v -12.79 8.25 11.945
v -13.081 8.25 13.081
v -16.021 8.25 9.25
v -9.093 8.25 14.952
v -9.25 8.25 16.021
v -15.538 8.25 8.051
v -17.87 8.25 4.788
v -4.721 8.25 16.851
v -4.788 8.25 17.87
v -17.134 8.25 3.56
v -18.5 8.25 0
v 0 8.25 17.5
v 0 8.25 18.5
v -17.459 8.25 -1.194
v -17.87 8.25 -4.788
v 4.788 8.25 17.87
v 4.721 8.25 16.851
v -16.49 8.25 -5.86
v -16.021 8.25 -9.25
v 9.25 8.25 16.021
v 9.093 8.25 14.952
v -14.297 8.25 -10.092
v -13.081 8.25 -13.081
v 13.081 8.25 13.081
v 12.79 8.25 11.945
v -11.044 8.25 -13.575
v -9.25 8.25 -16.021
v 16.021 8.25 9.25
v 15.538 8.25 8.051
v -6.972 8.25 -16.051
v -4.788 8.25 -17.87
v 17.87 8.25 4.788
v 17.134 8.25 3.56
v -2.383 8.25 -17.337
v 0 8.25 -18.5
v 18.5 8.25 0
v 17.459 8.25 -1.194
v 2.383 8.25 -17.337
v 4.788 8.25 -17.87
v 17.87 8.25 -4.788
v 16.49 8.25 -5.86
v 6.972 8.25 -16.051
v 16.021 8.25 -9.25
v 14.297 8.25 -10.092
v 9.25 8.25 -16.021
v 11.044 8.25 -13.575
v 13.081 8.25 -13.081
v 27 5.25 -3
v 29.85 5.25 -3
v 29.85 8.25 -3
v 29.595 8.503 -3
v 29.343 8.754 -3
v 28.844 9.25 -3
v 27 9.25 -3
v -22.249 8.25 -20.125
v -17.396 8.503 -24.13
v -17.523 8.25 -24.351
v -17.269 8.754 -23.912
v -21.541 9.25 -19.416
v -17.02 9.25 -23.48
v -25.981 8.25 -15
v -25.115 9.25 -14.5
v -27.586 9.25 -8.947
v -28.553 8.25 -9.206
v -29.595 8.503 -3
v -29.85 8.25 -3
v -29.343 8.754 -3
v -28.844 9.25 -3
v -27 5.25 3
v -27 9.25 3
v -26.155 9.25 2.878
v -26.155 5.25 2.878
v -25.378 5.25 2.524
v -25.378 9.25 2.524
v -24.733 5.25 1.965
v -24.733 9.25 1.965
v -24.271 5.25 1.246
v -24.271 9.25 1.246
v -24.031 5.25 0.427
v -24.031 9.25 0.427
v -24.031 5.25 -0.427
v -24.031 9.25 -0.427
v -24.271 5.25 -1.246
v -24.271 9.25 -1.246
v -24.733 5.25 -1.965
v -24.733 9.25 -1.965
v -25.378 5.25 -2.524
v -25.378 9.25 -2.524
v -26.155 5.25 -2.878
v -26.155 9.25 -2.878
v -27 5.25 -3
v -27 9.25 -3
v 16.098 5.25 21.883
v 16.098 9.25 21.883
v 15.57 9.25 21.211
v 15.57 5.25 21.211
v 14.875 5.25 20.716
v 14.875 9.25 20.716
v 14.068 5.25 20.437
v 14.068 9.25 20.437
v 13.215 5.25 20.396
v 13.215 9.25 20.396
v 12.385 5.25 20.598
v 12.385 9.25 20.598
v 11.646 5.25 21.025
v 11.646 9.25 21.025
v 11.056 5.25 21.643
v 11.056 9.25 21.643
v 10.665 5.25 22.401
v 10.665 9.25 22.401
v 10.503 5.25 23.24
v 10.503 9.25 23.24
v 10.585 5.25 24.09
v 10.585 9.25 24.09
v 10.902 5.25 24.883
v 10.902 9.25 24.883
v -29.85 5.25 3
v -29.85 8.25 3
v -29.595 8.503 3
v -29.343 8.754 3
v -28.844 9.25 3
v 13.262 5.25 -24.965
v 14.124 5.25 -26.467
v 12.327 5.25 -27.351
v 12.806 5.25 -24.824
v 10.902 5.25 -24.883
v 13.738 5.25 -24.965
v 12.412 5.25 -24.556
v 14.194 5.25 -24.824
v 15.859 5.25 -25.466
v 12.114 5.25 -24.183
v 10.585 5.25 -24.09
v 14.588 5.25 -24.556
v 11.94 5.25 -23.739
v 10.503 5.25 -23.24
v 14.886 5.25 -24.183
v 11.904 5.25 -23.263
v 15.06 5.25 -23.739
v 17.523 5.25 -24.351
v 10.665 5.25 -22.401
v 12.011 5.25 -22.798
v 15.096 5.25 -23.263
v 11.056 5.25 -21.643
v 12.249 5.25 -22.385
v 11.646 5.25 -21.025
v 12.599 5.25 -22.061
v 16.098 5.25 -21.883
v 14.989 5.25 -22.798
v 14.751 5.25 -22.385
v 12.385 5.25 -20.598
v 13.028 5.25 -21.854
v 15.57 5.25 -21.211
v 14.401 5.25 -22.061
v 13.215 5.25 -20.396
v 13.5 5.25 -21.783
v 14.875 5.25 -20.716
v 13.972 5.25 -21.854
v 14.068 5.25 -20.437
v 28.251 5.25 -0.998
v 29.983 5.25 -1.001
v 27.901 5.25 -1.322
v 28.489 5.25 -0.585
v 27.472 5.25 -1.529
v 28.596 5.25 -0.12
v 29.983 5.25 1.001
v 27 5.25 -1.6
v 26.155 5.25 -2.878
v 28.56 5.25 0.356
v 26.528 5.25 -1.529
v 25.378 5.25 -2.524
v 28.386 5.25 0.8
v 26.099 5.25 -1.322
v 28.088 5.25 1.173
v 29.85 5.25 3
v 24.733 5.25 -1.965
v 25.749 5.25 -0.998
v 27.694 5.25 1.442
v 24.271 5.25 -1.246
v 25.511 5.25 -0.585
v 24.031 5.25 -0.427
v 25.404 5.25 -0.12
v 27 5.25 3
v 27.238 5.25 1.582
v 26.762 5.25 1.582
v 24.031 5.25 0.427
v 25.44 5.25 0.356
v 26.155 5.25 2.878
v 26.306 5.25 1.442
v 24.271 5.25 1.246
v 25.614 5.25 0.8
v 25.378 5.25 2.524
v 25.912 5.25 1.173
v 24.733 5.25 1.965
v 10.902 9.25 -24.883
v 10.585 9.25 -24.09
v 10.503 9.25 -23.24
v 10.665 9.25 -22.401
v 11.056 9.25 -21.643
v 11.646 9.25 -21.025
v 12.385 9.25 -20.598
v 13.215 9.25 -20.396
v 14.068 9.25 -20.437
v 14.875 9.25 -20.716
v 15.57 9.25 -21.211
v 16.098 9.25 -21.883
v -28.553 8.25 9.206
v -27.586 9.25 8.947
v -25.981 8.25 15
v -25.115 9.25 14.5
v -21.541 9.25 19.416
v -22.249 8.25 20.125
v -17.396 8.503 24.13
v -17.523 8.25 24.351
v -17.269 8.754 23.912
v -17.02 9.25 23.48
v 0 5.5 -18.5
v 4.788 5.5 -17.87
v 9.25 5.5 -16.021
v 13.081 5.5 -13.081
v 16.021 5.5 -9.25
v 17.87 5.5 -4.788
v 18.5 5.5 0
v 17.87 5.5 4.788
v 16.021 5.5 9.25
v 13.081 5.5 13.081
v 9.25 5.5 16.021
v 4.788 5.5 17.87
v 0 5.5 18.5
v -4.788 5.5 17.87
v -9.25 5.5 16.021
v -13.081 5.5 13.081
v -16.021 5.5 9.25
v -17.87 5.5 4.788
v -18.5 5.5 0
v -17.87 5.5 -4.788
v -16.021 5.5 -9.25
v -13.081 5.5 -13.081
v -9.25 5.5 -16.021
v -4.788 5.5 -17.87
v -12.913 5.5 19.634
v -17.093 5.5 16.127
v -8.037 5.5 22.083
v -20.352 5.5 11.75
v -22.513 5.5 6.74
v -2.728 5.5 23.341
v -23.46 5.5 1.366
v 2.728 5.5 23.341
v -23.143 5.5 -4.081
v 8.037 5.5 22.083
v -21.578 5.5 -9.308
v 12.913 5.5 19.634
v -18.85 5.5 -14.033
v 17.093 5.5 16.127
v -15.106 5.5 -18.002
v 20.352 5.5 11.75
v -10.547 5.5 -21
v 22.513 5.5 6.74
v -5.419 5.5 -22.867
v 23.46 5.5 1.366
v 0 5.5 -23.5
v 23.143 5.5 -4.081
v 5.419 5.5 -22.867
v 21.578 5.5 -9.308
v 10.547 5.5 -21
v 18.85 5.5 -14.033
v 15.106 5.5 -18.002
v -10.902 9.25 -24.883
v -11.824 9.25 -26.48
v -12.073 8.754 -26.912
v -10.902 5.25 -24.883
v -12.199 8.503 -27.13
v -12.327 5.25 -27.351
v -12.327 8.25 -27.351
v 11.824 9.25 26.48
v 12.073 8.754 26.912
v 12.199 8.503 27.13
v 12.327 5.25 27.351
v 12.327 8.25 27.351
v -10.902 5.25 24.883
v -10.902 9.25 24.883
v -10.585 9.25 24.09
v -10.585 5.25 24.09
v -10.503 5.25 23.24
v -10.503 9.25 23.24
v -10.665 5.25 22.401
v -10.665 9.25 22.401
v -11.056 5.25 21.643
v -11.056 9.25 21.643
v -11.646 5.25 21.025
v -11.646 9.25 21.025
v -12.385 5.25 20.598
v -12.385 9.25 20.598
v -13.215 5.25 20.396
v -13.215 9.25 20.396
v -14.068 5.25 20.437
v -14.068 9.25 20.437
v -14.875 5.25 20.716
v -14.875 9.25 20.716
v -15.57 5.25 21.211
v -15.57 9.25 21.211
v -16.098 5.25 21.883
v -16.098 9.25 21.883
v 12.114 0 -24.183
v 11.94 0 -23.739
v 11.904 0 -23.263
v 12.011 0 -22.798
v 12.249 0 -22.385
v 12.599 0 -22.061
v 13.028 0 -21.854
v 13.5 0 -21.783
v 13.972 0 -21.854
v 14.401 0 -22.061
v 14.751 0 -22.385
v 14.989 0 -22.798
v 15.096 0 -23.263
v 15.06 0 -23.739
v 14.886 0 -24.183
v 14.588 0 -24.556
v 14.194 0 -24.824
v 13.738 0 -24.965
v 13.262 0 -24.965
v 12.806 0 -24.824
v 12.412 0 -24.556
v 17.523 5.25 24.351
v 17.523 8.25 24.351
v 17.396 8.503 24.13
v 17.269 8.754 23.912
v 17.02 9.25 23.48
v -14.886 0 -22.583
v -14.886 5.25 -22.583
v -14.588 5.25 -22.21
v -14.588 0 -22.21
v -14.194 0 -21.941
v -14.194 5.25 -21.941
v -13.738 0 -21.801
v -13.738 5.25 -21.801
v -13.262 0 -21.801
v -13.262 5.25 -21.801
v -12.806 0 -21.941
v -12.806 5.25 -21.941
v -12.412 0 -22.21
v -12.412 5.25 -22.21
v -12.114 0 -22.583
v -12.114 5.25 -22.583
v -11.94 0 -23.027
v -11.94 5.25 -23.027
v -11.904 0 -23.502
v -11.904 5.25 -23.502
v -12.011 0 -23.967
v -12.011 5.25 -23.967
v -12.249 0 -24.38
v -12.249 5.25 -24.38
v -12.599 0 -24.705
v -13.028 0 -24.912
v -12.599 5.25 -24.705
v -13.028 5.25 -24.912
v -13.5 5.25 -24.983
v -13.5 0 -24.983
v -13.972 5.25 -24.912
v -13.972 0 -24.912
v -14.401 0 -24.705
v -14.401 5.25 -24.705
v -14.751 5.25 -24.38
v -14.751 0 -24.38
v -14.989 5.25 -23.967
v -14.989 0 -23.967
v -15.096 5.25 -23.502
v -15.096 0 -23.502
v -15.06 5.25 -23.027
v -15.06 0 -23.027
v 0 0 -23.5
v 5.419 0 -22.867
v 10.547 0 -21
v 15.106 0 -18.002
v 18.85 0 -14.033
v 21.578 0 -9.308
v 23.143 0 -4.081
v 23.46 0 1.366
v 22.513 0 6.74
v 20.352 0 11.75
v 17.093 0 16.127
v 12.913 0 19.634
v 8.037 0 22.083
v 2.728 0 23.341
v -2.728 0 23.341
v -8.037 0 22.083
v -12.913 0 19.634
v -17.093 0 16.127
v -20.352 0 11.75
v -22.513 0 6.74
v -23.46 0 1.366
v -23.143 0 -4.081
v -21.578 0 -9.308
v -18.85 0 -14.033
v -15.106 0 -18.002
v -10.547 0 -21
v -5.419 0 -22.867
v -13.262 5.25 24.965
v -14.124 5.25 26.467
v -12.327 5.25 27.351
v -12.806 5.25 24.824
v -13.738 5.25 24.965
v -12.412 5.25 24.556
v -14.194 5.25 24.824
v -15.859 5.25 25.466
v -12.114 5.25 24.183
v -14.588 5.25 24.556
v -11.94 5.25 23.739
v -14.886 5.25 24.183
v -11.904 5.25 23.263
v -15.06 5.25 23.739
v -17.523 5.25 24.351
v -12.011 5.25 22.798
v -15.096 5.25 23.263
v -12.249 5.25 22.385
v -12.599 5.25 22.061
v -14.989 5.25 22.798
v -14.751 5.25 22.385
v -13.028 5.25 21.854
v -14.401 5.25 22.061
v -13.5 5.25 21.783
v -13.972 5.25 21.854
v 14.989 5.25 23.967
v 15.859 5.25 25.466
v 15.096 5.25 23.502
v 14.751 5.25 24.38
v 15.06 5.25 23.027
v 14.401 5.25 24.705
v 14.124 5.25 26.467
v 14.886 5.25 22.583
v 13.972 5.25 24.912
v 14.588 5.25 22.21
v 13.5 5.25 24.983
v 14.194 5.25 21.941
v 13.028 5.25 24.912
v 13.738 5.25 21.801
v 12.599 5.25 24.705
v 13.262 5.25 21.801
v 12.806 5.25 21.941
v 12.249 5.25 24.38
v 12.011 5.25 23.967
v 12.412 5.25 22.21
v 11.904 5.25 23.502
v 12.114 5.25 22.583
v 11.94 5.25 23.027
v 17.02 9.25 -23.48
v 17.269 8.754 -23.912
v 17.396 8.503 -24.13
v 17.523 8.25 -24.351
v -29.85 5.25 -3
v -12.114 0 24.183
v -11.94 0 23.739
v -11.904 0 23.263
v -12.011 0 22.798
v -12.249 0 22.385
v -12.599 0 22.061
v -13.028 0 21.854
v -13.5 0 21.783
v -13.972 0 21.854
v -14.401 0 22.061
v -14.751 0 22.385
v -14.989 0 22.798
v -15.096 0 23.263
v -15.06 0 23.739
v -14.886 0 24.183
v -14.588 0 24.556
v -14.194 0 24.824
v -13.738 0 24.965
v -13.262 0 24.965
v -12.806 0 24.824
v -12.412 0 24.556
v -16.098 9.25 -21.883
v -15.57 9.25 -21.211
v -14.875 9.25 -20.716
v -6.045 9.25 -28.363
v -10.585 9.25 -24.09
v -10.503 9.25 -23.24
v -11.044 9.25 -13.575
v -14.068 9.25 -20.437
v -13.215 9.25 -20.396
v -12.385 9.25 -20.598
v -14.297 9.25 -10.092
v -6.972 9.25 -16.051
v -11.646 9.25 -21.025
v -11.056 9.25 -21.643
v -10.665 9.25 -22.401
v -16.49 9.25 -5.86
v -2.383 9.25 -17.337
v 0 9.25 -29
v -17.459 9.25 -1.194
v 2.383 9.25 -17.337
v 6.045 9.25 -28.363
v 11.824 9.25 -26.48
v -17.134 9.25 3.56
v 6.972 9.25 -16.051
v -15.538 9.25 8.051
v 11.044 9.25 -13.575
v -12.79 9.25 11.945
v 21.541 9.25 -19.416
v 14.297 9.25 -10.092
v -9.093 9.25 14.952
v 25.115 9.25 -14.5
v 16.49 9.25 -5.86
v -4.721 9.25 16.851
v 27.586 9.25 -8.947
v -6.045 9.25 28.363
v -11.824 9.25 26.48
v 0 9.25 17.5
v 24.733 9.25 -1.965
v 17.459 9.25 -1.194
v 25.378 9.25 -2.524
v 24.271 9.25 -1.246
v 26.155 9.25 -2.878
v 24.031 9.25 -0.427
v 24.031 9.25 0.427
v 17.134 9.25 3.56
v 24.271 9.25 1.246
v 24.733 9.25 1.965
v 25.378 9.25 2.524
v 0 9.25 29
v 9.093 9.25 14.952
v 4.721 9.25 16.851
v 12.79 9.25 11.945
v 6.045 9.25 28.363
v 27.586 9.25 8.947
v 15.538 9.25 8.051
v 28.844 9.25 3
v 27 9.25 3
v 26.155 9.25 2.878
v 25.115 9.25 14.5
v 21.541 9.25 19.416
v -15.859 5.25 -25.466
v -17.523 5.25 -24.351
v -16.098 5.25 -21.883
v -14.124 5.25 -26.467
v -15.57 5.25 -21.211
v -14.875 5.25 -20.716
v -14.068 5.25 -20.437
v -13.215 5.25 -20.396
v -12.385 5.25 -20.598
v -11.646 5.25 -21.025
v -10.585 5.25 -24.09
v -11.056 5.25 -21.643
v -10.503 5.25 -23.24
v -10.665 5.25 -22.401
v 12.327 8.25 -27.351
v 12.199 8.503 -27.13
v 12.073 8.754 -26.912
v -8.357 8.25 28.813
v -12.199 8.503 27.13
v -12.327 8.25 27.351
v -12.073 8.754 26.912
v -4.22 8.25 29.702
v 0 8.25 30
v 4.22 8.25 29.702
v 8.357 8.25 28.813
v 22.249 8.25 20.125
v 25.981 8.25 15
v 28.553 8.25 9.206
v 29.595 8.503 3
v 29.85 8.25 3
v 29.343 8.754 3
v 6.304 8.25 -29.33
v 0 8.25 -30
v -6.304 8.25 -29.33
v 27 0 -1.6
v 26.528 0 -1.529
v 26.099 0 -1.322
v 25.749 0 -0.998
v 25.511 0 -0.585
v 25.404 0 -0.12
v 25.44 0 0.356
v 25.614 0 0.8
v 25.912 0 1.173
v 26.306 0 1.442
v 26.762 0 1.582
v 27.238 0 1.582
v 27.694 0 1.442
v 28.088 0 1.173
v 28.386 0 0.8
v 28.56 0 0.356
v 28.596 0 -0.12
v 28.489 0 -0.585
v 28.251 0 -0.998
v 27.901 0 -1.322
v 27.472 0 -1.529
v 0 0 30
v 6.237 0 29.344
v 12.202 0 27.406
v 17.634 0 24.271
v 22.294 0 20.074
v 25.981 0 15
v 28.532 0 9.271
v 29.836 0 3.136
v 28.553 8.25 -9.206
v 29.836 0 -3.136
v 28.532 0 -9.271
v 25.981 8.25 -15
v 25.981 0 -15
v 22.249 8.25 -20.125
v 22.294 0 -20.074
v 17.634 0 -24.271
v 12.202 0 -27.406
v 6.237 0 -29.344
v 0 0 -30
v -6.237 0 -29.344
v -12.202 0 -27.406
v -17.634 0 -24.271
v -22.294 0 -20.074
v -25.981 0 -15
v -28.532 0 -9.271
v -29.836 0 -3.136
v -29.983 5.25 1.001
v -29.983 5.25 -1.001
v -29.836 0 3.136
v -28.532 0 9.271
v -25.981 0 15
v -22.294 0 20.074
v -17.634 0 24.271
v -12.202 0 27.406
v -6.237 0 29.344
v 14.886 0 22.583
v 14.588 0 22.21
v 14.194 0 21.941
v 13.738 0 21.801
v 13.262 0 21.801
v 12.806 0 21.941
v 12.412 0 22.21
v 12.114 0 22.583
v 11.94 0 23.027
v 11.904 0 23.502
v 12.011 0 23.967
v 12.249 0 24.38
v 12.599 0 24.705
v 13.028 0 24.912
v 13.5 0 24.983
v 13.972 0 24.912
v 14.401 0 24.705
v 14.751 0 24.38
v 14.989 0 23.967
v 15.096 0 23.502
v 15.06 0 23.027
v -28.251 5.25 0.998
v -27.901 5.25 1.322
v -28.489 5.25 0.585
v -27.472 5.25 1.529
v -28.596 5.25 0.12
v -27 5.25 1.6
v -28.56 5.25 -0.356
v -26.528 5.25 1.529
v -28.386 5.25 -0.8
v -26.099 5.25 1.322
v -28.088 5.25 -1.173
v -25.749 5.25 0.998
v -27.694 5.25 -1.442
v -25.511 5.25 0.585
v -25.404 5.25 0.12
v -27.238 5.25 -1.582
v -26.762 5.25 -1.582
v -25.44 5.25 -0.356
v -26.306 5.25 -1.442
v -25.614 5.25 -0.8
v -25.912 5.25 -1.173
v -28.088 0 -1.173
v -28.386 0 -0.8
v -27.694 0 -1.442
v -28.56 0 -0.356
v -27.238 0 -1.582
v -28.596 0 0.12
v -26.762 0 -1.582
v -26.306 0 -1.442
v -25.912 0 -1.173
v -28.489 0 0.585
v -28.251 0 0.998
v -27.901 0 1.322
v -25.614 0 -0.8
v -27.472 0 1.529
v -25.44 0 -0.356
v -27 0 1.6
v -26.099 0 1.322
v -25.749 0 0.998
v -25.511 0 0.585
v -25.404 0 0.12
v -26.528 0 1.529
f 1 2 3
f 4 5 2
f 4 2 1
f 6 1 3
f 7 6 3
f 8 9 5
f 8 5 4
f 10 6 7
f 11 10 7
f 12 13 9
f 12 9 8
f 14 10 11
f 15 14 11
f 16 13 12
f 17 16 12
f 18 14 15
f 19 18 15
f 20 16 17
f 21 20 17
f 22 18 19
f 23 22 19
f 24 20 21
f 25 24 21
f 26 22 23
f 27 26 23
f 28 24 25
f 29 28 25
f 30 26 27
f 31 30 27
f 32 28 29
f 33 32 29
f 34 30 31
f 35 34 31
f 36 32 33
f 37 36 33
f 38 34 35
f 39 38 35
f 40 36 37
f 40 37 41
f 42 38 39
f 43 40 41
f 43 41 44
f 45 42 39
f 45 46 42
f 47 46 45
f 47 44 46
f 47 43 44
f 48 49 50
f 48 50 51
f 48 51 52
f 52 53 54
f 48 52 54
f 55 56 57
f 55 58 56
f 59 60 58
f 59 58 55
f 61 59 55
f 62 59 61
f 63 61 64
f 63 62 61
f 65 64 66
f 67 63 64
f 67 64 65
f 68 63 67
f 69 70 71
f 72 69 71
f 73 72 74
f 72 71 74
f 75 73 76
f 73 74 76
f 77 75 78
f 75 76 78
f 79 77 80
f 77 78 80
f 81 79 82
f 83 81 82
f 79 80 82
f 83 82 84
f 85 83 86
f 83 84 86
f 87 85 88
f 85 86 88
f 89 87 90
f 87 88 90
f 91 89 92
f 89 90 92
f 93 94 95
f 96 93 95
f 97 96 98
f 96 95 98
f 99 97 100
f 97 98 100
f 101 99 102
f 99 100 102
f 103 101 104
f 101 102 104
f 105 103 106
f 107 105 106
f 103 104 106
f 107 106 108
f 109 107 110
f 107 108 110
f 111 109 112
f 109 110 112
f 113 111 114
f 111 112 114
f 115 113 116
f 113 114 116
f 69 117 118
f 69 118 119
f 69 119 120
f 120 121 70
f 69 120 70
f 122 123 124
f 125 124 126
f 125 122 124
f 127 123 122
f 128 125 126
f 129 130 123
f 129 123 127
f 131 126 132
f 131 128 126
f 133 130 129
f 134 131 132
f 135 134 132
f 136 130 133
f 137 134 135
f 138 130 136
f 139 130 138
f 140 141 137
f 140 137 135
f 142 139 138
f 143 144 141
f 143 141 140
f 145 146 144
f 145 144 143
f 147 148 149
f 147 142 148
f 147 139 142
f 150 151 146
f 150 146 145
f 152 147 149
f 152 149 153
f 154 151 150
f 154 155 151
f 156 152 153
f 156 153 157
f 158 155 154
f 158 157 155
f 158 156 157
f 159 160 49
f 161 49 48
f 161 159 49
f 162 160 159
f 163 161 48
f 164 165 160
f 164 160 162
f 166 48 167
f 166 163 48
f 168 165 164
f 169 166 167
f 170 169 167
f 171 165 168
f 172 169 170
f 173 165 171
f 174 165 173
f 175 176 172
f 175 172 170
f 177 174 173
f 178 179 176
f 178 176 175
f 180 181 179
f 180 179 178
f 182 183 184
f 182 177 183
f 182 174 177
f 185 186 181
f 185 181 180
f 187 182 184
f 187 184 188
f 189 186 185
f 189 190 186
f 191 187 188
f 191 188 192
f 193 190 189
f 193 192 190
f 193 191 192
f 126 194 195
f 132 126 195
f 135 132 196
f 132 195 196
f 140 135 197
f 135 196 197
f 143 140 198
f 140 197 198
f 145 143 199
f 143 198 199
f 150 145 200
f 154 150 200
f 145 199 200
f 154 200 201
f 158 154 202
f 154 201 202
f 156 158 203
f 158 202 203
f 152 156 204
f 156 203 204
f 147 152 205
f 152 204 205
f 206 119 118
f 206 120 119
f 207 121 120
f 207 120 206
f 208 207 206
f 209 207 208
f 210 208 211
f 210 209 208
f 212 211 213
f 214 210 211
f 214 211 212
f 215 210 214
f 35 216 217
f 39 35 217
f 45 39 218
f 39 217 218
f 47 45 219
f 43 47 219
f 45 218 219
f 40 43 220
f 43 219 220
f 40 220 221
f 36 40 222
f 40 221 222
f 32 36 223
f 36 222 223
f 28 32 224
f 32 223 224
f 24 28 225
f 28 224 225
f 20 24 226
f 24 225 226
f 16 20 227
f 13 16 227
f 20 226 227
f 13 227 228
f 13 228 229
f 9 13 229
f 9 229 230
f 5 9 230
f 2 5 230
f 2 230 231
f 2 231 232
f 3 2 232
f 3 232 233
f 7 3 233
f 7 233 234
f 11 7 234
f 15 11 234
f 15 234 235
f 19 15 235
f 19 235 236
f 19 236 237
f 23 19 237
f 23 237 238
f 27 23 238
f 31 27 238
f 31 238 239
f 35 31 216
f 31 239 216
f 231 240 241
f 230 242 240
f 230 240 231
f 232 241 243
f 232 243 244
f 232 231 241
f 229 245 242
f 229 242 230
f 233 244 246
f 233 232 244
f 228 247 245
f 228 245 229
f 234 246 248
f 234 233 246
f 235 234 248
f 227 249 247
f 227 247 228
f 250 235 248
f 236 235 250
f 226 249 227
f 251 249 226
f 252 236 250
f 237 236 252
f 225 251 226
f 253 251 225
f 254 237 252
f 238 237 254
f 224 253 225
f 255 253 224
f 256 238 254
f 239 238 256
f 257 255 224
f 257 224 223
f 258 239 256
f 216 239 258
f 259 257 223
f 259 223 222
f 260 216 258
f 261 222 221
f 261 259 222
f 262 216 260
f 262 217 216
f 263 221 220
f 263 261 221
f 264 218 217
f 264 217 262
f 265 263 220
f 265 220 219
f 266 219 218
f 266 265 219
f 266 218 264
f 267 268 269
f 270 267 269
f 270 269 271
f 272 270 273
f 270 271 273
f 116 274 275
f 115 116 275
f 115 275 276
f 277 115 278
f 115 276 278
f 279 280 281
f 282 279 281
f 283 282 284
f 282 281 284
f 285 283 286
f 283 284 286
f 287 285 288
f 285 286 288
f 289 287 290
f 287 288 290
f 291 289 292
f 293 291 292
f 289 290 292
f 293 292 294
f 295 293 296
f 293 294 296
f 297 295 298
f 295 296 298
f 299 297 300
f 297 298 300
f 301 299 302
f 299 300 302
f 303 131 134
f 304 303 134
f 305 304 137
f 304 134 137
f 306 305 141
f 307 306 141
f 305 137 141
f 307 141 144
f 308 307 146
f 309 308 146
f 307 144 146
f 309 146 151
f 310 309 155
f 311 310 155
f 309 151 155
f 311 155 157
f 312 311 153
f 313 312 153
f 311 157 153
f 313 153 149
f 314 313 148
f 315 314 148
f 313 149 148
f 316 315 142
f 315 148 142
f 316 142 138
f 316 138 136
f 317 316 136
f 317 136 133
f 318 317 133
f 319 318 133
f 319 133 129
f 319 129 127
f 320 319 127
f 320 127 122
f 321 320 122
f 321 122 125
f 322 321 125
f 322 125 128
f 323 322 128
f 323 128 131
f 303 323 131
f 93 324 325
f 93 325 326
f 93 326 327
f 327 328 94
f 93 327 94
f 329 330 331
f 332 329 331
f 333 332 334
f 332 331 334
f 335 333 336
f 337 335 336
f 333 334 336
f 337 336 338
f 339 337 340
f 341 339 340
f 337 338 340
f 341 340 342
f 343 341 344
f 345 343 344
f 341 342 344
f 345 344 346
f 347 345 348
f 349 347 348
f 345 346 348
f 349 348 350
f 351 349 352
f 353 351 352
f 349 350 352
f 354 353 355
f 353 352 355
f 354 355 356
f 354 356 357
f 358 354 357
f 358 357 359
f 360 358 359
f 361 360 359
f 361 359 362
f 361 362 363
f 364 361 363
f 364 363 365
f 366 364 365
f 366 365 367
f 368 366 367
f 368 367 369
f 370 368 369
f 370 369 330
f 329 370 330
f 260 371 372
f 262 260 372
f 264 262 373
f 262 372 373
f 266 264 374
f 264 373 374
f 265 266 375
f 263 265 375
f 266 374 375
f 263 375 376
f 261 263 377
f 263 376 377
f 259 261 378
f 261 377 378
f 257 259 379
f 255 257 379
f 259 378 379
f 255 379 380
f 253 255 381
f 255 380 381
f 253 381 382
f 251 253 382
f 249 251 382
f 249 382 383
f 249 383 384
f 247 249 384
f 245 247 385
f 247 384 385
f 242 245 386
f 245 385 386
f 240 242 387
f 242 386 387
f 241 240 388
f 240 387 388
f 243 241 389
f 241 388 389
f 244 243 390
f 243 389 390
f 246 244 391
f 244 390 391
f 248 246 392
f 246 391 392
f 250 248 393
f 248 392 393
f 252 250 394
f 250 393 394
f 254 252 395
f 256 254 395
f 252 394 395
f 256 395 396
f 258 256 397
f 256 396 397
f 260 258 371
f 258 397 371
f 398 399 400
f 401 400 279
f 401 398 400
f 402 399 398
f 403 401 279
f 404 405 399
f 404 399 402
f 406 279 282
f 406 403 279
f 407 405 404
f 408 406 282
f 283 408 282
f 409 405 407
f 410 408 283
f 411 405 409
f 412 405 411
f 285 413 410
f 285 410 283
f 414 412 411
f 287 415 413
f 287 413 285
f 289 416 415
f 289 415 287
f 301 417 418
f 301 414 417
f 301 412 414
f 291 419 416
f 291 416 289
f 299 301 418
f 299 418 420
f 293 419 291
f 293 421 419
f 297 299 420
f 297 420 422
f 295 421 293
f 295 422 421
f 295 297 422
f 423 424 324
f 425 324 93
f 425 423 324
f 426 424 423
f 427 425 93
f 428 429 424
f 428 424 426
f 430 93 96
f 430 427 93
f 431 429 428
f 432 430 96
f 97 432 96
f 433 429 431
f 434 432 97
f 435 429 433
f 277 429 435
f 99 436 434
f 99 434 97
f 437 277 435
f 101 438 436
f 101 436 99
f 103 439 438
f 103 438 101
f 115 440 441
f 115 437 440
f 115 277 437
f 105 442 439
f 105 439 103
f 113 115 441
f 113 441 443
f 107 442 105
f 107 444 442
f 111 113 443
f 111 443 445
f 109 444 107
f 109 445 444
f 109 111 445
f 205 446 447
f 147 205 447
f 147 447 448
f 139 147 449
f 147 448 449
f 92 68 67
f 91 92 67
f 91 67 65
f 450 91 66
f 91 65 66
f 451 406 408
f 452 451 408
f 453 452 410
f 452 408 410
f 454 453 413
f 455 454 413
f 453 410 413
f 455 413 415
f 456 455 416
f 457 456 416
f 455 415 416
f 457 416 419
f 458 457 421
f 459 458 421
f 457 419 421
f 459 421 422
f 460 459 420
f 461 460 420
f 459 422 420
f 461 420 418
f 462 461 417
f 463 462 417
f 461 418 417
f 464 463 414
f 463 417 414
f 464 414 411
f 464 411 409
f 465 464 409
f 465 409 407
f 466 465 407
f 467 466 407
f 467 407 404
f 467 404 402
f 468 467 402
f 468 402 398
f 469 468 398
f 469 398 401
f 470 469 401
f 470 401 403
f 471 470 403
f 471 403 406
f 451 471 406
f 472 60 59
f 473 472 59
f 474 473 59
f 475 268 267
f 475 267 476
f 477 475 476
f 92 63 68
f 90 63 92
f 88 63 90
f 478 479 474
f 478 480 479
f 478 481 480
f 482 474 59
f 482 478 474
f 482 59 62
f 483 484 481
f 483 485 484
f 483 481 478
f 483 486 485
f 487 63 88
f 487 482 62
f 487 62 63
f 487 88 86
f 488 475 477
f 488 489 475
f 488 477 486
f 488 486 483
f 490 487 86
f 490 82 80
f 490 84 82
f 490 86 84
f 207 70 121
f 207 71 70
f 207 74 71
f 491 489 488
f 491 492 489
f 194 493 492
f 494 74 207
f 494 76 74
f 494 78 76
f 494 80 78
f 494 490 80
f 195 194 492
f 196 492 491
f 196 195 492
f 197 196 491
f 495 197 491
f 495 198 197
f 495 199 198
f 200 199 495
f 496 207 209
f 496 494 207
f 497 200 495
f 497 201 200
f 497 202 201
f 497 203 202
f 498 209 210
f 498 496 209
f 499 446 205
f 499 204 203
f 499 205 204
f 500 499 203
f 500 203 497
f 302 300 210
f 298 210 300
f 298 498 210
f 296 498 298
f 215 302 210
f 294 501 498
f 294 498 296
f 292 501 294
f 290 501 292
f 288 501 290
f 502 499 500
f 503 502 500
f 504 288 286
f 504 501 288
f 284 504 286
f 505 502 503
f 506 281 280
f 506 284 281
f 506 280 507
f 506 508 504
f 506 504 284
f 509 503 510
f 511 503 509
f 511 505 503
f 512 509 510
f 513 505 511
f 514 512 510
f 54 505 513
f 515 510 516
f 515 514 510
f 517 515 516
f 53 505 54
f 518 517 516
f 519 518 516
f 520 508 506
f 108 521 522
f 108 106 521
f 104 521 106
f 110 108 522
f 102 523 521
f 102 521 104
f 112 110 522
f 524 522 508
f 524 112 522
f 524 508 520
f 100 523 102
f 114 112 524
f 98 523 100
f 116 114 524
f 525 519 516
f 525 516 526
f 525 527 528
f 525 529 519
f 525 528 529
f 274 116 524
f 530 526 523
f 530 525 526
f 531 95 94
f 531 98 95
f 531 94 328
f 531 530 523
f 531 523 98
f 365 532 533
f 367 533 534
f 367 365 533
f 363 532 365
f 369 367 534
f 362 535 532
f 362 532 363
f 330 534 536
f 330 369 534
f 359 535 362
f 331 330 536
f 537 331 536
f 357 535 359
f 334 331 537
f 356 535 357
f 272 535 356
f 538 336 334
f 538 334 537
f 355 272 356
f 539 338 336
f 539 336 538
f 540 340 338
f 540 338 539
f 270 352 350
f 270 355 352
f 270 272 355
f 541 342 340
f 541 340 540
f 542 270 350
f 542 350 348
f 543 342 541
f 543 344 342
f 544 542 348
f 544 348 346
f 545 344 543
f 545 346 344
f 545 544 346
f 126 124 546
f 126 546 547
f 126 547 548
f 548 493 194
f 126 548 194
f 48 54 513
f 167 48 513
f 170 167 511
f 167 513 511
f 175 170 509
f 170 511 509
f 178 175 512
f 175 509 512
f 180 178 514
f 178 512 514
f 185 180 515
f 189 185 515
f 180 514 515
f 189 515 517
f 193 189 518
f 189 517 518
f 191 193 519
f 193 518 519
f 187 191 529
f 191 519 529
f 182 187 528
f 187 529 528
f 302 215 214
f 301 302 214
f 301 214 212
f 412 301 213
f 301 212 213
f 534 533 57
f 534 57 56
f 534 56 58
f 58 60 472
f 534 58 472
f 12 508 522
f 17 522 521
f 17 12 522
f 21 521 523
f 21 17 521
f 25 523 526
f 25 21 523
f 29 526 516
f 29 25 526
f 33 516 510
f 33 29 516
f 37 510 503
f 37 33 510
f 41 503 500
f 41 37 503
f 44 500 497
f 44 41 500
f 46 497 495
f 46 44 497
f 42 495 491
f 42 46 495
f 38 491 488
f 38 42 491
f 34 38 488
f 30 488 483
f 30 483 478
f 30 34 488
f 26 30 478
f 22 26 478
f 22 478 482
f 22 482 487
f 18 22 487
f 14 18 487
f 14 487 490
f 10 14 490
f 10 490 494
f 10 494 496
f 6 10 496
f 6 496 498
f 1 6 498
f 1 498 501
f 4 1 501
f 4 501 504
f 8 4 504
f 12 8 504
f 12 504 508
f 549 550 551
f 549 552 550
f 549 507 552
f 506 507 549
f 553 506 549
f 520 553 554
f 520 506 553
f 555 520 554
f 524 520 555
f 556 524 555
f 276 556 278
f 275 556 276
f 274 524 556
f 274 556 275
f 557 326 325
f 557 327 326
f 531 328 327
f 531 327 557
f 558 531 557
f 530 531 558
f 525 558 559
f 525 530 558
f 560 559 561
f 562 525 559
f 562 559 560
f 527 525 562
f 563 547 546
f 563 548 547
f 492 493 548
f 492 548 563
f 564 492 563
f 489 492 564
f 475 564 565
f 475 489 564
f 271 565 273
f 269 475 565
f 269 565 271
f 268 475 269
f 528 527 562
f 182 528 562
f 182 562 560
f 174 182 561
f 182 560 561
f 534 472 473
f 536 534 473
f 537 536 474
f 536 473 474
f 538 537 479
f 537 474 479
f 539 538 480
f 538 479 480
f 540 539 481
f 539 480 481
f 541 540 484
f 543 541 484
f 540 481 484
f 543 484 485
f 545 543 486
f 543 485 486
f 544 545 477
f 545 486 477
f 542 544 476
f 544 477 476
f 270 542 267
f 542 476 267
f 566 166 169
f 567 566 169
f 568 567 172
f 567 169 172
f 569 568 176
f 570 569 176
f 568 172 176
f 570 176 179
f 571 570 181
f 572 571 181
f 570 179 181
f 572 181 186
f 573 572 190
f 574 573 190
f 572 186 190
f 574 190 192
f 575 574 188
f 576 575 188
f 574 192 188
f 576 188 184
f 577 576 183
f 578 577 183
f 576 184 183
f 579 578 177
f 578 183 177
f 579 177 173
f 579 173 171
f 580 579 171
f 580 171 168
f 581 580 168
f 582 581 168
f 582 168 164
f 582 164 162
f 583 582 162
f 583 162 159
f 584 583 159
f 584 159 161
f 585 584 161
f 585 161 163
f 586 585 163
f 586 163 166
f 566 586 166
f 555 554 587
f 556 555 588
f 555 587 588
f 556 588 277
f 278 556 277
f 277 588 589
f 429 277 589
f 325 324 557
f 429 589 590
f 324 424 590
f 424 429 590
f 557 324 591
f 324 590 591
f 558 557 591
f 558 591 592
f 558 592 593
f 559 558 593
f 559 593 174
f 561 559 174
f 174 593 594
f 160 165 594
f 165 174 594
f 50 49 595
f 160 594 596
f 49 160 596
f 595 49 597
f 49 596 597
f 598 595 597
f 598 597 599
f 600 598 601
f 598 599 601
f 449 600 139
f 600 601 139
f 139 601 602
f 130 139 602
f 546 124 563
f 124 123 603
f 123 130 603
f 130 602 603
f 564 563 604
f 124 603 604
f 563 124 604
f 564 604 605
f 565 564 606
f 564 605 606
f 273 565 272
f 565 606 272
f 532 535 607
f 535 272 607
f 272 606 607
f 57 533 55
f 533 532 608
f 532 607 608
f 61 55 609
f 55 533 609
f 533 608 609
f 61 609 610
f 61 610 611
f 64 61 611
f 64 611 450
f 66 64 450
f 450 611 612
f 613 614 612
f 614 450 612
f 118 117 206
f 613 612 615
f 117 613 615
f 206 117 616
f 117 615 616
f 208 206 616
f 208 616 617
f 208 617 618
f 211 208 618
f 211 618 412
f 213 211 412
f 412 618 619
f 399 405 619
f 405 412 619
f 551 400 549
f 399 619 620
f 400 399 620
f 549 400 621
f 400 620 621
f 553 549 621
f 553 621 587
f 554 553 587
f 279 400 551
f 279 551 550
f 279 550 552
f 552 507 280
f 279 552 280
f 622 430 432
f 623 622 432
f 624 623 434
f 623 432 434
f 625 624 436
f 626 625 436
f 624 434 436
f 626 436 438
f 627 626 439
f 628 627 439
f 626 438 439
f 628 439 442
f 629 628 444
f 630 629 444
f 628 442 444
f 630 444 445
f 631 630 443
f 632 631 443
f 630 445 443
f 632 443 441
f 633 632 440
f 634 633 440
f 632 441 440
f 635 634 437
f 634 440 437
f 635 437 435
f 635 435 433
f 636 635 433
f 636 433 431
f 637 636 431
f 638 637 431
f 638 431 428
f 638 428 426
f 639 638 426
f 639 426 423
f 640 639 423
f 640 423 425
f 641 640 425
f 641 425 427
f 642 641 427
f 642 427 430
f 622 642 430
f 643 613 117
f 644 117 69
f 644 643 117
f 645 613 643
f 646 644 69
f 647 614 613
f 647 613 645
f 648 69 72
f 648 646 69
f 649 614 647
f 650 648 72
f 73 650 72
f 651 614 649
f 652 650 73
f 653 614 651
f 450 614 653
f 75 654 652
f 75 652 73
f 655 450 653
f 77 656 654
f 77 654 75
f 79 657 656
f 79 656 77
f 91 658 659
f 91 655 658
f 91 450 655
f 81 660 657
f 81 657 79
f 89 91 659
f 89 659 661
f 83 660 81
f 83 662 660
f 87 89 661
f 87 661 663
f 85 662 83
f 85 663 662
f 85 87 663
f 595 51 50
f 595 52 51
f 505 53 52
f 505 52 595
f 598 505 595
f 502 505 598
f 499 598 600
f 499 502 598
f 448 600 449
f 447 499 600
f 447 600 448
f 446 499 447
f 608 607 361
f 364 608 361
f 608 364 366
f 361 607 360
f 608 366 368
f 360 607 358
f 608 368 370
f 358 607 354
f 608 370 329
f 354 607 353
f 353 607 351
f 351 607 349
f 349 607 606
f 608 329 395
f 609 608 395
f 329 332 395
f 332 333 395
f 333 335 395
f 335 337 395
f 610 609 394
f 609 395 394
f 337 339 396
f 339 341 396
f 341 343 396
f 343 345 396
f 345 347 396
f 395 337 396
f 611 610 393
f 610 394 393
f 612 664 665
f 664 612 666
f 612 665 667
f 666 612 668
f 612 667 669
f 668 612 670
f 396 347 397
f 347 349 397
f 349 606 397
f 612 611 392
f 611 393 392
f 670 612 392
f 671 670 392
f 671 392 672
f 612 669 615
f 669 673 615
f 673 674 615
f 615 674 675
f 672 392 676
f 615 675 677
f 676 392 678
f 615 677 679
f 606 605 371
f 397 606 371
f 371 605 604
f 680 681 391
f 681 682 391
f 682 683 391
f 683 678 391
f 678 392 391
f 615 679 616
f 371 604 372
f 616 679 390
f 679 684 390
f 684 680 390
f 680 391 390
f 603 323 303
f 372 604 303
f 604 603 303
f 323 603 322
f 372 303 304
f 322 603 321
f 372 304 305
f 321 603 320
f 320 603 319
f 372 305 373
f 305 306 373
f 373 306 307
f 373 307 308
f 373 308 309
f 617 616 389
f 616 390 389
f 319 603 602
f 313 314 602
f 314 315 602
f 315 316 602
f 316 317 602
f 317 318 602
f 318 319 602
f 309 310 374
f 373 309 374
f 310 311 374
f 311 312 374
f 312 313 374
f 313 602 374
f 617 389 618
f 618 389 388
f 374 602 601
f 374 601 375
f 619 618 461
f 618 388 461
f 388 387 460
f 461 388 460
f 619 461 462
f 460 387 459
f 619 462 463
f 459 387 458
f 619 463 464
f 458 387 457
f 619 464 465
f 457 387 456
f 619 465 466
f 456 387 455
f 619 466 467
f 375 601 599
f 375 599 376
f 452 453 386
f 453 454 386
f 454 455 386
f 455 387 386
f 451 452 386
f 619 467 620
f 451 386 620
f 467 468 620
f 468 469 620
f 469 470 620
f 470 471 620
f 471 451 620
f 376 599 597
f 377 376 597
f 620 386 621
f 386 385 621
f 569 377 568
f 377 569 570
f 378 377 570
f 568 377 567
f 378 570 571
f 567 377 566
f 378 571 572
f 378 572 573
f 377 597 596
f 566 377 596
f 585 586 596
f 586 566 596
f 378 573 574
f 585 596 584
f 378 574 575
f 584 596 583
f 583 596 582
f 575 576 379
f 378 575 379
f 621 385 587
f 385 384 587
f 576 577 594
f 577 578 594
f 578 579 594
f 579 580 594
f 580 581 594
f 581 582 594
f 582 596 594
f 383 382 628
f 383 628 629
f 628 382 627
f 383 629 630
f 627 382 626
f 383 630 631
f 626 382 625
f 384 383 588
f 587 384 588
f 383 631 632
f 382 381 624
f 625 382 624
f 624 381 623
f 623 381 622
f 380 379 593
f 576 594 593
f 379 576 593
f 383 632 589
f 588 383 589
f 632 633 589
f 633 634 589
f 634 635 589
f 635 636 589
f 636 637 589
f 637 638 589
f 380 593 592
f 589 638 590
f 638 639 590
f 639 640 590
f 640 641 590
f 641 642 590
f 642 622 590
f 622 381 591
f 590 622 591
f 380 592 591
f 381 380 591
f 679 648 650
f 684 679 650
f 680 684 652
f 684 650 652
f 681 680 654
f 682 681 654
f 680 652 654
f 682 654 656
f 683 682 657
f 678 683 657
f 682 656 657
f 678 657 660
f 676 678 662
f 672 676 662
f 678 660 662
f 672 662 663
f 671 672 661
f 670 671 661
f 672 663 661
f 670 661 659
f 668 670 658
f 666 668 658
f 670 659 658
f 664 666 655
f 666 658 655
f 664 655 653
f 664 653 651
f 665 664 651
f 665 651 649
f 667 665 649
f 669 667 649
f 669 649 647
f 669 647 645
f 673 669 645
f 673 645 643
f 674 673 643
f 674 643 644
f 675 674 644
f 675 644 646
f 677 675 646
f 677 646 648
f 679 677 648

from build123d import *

# Parameters (mm, degrees)
SKETCH1_R           = 30
SKETCH1_R_2         = 17.5
BOSS_EXTRUDE1_DEPTH = 9.25
SKETCH2_R           = 1.6
CUT_EXTRUDE1_DEPTH  = 9.25
CUT_EXTRUDE2_DEPTH  = 4
SKETCH4_R           = 23.5
CUT_EXTRUDE3_DEPTH  = 5.5
SKETCH5_R           = 18.5
CUT_EXTRUDE4_DEPTH  = 8.25
CIRPATTERN1_COUNT   = 6
CHAMFER1_SIZE       = 1


with BuildPart() as part:
    # Sketch1 → Boss-Extrude1 (new body)
    with BuildSketch(Plane(origin=(0, 0, 0), x_dir=(1, 0, 0), z_dir=(0, 1, 0))):
        with Locations(Location((0, 0, 0), (0, 0, 270))):
            Circle(SKETCH1_R)
        with Locations(Location((0, 0, 0), (0, 0, 270))):
            Circle(SKETCH1_R_2, mode=Mode.SUBTRACT)
    extrude(amount=BOSS_EXTRUDE1_DEPTH)

    # Sketch2 → Cut-Extrude1 (cut)
    with BuildSketch(Plane(origin=(0, 9.25, 0), x_dir=(1, 0, 0), z_dir=(0, 1, 0))):
        with Locations(Location((-27, 0, 0), (0, 0, 270))):
            Circle(SKETCH2_R)
    cut_extrude1 = extrude(amount=-CUT_EXTRUDE1_DEPTH, mode=Mode.SUBTRACT)

    # Sketch3 → Cut-Extrude2 (cut)
    with BuildSketch(Plane(origin=(0, 9.25, 0), x_dir=(1, 0, 0), z_dir=(0, 1, 0))):
        with BuildLine():
            Line((-27, 3), (-31.510174131, 3))
            Line((-31.510174131, 3), (-31.510174131, -3))
            Line((-31.510174131, -3), (-27, -3))
            ThreePointArc((-27, -3), (-24, 0), (-27, 3))
        make_face()
    cut_extrude2 = extrude(amount=-CUT_EXTRUDE2_DEPTH, mode=Mode.SUBTRACT)

    # Sketch4 → Cut-Extrude3 (cut)
    with BuildSketch(Plane.XZ):
        with Locations(Location((0, 0, 0), (0, 0, 270))):
            Circle(SKETCH4_R)
    extrude(amount=-CUT_EXTRUDE3_DEPTH, mode=Mode.SUBTRACT)

    # Sketch5 → Cut-Extrude4 (cut)
    with BuildSketch(Plane.XZ):
        with Locations(Location((0, 0, 0), (0, 0, 270))):
            Circle(SKETCH5_R)
    extrude(amount=-CUT_EXTRUDE4_DEPTH, mode=Mode.SUBTRACT)

    # CirPattern1: Cut-Extrude1, Cut-Extrude2 ×6 about axis
    cirpattern1_axis = Axis((0, 0, 0), (0, 1, 0))
    add([cut_extrude1.rotate(cirpattern1_axis, i * 360 / CIRPATTERN1_COUNT) for i in range(1, CIRPATTERN1_COUNT)], mode=Mode.SUBTRACT)
    add([cut_extrude2.rotate(cirpattern1_axis, i * 360 / CIRPATTERN1_COUNT) for i in range(1, CIRPATTERN1_COUNT)], mode=Mode.SUBTRACT)

    # Chamfer1
    chamfer1_edges = [part.edges().sort_by_distance(p)[0] for p in [
        (-25.980762114, 9.25, 15),
        (6.304127327, 9.25, 29.330154767),
        (25.980762114, 9.25, 15),
        (25.980762114, 9.25, -15),
        (0, 9.25, -30),
        (-25.980762114, 9.25, -15),
    ]]
    chamfer(chamfer1_edges, length=CHAMFER1_SIZE)


solid = part.part
